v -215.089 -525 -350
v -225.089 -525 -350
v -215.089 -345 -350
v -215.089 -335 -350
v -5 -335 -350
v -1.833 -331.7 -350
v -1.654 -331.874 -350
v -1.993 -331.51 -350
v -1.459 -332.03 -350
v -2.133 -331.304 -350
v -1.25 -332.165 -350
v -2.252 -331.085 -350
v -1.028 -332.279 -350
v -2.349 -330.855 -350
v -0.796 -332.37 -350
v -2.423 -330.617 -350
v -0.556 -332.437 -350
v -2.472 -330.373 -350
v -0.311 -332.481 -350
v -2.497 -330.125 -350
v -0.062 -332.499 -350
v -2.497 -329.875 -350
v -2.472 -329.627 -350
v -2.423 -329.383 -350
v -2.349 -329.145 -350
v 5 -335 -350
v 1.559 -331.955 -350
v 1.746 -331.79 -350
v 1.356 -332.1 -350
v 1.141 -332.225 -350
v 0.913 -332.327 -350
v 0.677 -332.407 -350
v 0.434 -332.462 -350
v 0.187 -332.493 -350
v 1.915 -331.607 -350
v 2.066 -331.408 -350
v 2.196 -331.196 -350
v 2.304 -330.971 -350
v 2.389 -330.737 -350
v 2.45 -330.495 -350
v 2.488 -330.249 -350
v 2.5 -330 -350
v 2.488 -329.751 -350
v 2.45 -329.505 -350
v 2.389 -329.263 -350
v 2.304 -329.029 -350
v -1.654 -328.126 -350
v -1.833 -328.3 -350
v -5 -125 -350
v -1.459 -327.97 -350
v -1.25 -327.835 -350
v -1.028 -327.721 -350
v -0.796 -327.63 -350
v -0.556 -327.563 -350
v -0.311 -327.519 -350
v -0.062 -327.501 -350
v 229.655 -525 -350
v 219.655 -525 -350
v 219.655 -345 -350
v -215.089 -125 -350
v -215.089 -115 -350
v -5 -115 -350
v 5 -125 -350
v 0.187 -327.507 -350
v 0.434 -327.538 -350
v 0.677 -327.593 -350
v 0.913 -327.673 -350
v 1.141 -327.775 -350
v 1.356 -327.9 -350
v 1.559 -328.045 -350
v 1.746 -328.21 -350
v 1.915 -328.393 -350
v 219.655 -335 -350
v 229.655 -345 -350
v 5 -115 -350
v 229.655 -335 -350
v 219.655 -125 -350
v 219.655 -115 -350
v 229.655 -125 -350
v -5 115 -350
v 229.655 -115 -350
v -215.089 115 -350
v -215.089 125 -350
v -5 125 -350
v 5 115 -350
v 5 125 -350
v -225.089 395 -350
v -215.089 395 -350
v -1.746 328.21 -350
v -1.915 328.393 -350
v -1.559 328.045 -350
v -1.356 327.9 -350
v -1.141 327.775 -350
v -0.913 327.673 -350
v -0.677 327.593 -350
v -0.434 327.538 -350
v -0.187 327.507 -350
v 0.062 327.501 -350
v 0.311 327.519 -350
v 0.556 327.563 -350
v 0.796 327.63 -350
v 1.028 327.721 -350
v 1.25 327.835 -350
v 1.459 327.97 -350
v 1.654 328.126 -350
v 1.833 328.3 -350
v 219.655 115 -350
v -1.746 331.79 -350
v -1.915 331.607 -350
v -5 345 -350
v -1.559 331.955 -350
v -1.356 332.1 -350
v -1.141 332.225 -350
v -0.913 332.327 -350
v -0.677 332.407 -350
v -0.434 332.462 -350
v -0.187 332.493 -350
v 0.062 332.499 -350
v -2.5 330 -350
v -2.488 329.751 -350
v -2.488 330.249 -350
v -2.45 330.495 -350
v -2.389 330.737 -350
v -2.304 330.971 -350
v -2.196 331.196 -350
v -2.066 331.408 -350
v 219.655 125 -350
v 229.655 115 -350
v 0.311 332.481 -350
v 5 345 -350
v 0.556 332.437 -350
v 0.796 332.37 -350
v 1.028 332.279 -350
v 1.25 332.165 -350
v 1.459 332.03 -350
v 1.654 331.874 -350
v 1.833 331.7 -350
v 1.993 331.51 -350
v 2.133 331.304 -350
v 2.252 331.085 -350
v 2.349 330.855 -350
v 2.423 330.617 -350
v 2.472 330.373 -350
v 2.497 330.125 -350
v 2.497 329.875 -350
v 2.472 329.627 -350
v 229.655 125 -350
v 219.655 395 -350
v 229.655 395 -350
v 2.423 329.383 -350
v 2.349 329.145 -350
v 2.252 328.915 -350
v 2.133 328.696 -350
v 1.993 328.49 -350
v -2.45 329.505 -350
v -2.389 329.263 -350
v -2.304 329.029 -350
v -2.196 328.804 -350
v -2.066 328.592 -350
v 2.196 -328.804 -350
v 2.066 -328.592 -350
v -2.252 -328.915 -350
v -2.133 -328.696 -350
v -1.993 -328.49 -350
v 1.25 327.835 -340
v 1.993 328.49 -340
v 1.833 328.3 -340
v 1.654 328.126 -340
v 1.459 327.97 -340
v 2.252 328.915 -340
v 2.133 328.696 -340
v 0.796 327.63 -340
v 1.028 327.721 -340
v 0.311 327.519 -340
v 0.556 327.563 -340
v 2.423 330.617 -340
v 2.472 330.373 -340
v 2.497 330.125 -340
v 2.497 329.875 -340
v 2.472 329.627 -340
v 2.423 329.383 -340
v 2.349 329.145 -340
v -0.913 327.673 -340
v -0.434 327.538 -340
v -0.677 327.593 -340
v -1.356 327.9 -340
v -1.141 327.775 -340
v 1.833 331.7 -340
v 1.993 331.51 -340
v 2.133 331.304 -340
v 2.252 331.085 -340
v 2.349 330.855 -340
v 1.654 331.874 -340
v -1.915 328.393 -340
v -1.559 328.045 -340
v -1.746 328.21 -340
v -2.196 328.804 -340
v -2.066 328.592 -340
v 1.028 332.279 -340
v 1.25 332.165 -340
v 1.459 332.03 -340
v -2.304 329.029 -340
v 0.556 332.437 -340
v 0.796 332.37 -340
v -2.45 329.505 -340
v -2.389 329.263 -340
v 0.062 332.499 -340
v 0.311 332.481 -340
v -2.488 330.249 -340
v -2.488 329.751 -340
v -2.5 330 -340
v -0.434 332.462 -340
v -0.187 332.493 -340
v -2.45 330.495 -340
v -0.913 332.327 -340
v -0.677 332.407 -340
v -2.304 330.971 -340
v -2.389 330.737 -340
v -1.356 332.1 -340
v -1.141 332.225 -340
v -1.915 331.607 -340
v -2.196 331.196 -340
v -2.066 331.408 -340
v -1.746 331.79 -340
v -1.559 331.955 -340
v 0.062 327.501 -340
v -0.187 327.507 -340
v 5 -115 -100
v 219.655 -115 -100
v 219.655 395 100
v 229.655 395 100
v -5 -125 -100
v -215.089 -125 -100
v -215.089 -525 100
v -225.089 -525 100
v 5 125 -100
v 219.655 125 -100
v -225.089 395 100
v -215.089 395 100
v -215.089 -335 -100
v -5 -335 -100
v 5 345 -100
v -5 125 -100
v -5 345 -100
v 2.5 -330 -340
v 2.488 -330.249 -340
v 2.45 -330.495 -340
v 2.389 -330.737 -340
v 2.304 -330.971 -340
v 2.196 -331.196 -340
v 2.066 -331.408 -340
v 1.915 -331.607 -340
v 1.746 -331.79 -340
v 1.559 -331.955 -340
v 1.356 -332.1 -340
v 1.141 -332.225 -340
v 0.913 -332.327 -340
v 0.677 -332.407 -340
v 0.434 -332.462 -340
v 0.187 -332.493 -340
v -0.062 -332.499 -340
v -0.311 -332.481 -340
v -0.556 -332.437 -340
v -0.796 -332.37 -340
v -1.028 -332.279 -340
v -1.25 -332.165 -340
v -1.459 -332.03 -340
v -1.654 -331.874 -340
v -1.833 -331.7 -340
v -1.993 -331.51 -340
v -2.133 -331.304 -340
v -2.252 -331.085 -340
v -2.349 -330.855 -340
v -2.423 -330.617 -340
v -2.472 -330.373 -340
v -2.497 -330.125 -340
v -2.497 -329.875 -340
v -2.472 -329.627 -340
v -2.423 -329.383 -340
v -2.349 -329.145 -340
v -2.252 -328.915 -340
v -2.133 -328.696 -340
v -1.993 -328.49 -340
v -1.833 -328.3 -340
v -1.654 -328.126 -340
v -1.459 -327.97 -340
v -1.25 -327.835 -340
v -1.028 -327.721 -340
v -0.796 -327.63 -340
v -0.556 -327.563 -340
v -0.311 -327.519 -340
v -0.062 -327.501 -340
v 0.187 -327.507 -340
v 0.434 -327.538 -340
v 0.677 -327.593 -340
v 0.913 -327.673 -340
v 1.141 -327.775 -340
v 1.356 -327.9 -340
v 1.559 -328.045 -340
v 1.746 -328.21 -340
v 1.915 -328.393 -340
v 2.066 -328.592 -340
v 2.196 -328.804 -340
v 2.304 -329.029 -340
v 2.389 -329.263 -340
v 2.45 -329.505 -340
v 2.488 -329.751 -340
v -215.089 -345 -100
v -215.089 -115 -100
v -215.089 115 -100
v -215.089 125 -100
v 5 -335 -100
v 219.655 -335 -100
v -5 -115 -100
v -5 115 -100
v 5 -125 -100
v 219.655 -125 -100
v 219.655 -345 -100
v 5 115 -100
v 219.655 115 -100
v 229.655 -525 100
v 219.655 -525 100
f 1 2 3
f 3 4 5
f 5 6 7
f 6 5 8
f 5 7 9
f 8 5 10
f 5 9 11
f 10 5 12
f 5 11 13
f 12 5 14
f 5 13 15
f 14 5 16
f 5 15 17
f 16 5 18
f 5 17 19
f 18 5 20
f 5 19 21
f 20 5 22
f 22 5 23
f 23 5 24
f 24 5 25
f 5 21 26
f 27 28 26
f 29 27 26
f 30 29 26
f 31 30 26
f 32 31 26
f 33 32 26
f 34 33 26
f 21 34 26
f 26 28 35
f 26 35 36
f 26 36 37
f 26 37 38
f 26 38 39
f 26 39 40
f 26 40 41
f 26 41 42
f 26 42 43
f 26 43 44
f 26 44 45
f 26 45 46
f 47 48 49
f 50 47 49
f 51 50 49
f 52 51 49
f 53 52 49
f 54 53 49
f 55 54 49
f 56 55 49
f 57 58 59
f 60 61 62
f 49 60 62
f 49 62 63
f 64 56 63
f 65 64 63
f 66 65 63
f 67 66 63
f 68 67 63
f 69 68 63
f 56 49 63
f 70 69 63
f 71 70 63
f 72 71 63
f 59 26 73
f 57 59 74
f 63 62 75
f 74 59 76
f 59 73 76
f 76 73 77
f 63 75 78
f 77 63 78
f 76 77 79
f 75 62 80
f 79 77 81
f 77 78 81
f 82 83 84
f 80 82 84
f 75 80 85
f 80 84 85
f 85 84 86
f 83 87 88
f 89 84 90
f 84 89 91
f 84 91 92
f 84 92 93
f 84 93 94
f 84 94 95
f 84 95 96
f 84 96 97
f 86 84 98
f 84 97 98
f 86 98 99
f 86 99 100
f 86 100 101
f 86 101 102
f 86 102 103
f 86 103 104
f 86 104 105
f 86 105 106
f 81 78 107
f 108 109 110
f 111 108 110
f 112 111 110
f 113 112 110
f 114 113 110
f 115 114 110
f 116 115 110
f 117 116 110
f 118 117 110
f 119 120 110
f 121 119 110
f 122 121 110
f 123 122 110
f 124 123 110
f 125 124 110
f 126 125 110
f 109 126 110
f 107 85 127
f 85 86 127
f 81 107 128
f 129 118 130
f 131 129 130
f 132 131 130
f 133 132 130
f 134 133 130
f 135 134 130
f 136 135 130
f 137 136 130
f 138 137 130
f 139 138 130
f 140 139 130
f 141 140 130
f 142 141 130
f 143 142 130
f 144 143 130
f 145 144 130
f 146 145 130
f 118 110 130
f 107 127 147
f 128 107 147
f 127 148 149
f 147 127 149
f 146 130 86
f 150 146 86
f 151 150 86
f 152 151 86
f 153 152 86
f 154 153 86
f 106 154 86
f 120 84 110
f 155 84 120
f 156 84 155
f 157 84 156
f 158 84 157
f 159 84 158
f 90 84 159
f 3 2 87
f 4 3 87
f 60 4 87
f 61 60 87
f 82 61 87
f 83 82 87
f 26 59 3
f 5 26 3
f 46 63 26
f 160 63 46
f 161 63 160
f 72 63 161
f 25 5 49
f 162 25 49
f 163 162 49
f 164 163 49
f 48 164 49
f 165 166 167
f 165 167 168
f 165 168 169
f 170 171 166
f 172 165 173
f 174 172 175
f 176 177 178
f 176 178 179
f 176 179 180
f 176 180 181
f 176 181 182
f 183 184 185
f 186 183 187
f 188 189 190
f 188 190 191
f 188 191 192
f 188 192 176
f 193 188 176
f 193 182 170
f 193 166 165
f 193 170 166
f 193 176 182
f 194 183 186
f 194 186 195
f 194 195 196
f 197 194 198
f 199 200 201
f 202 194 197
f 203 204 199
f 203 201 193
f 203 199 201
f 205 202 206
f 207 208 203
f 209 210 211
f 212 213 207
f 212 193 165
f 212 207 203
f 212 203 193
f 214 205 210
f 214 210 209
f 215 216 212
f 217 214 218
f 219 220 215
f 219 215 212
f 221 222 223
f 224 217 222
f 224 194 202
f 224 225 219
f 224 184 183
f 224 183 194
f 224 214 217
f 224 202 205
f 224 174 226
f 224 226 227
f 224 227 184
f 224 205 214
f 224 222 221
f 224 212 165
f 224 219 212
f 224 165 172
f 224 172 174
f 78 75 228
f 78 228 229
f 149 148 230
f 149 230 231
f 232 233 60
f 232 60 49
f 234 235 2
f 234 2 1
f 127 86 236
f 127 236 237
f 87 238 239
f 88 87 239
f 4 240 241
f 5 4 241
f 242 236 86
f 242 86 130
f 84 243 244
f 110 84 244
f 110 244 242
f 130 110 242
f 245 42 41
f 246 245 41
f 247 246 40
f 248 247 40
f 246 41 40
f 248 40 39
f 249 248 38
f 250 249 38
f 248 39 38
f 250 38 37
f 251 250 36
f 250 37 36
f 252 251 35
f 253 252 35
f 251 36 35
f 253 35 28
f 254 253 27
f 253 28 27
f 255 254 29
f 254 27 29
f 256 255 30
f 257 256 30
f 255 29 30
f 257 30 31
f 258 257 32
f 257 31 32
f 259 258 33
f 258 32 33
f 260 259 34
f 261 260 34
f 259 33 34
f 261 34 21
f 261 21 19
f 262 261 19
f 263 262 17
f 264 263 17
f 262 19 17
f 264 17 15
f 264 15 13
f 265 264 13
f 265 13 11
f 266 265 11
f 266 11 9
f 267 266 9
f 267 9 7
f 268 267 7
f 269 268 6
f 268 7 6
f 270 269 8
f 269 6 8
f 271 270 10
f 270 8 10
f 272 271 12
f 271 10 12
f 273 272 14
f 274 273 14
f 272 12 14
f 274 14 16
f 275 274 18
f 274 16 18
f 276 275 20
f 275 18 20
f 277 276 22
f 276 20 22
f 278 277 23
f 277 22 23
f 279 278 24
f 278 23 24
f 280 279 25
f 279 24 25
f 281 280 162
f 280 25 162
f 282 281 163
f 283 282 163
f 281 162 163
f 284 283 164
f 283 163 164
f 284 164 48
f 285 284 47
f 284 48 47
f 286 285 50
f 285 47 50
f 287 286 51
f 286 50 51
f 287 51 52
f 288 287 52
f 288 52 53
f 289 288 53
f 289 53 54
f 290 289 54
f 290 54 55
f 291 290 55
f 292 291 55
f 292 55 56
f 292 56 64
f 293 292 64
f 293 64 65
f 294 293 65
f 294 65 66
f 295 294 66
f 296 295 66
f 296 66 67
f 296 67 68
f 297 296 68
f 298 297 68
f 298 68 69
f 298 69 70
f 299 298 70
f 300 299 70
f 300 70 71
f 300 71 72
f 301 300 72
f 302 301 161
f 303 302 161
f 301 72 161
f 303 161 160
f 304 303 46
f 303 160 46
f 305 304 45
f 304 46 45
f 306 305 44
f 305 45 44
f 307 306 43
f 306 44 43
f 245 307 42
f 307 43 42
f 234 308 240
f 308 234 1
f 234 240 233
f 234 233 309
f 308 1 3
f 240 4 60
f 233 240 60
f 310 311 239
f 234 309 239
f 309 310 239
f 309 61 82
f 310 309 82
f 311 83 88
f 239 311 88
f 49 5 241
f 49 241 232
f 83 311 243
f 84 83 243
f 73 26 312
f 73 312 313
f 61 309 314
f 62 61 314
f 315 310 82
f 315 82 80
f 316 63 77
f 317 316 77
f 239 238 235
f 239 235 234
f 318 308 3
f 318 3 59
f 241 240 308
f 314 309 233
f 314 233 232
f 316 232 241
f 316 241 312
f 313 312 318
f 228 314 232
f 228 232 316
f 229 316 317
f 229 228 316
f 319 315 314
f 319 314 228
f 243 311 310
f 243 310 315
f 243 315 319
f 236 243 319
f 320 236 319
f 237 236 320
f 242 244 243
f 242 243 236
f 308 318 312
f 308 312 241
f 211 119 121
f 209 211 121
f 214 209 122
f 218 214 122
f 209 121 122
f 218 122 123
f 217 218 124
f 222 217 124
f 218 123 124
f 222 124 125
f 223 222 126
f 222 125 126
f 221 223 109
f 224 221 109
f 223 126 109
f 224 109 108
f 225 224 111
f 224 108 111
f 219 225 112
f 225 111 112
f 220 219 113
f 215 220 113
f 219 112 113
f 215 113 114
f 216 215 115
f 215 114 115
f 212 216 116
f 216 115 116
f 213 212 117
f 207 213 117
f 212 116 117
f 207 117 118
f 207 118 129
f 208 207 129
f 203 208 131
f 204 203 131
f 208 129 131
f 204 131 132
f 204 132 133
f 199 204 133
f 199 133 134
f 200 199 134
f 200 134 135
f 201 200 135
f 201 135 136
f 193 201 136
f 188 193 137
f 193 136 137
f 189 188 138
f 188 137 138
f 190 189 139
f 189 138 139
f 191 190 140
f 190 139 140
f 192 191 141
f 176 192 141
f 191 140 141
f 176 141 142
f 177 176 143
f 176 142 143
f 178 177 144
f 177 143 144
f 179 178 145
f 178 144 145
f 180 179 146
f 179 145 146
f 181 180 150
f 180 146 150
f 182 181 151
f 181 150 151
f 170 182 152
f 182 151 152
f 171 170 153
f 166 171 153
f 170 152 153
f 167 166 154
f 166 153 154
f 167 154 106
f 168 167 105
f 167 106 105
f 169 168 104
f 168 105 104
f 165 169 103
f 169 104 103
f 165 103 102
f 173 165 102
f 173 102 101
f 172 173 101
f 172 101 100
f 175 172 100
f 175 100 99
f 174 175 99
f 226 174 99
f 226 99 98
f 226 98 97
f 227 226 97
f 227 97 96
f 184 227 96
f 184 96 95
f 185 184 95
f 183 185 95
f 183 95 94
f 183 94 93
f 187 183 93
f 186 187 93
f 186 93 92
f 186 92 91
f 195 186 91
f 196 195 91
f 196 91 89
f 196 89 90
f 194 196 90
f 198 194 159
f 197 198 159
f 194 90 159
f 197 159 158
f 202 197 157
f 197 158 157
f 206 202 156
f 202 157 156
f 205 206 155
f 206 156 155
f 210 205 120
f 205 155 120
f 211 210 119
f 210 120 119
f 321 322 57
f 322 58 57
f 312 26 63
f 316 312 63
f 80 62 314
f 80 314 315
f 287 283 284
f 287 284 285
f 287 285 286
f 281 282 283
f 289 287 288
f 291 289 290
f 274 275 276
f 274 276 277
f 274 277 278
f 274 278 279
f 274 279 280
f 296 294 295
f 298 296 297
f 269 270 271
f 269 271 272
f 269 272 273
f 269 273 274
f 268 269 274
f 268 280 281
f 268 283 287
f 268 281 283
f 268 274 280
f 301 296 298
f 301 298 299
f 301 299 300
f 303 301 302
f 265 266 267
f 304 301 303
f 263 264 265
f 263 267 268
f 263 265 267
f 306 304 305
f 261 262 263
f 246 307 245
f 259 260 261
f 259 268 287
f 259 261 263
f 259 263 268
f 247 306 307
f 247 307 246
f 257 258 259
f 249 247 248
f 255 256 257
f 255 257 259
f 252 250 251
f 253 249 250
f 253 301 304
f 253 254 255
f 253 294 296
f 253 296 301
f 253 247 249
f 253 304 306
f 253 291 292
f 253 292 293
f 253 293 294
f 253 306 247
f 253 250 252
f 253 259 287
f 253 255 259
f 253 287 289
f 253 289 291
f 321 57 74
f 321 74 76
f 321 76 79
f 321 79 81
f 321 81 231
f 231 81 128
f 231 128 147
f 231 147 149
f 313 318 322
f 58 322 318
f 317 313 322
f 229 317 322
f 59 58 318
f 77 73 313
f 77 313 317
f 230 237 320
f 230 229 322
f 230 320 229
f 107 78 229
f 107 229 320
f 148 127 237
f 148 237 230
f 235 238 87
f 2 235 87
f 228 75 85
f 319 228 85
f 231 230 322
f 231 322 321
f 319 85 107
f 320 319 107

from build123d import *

# Parameters (mm, degrees)
CROQUIS1_W              = 500
CROQUIS1_H              = 690
SALIENTE_EXTRUIR1_DEPTH = 350
CROQUIS2_W              = 245
CROQUIS2_H              = 210
CROQUIS2_H_2            = 230
CROQUIS2_H_3            = 220
CORTAR_EXTRUIR5_DEPTH   = 552.38462075
CROQUIS6_R              = 2.5
CORTAR_EXTRUIR6_DEPTH   = 10
CROQUIS8_W              = 454.743369925
CROQUIS8_H              = 727.77201974
CORTAR_EXTRUIR7_DEPTH   = 100
CROQUIS10_W             = 10
CROQUIS10_H             = 230
CROQUIS10_H_2           = 210
CROQUIS10_H_3           = 220
SALIENTE_EXTRUIR2_DEPTH = 250
CROQUIS11_W             = 564.486110896
CROQUIS11_H             = 131.072073745
CORTAR_EXTRUIR8_DEPTH   = 638.102817448
CROQUIS12_W             = 20.345466795
CROQUIS12_H             = 250
CROQUIS12_W_2           = 24.91116328
CORTAR_EXTRUIR9_DEPTH   = 638.102817448
CROQUIS13_W             = 10
CROQUIS13_H             = 920
SALIENTE_EXTRUIR3_DEPTH = 250
CROQUIS15_W             = 10
CROQUIS15_H             = 920
SALIENTE_EXTRUIR4_DEPTH = 200


with BuildPart() as part:
    # Croquis1 → Saliente-Extruir1 (new body)
    with BuildSketch(Plane.XY):
        Rectangle(CROQUIS1_W, CROQUIS1_H)
    extrude(amount=-SALIENTE_EXTRUIR1_DEPTH)

    # Croquis2 → Cortar-Extruir5 (cut, through all)
    with BuildSketch(Plane.XY):
        with Locations((127.5, -230)):
            Rectangle(CROQUIS2_W, CROQUIS2_H)
        with Locations((-127.5, -230)):
            Rectangle(CROQUIS2_W, CROQUIS2_H)
        with Locations((127.5, 0)):
            Rectangle(CROQUIS2_W, CROQUIS2_H_2)
        with Locations((-127.5, 0)):
            Rectangle(CROQUIS2_W, CROQUIS2_H_2)
        with Locations((127.5, 235)):
            Rectangle(CROQUIS2_W, CROQUIS2_H_3)
        with Locations((-127.5, 235)):
            Rectangle(CROQUIS2_W, CROQUIS2_H_3)
    extrude(amount=-CORTAR_EXTRUIR5_DEPTH, mode=Mode.SUBTRACT)

    # Croquis6 → Cortar-Extruir6 (cut)
    with BuildSketch(Plane(origin=(0, 0, -350), x_dir=(-1, 0, 0), z_dir=(0, 0, -1))):
        with Locations((0, 330)):
            Circle(CROQUIS6_R)
        with Locations(Location((0, -330, 0), (0, 0, 180))):
            Circle(CROQUIS6_R)
    extrude(amount=-CORTAR_EXTRUIR6_DEPTH, mode=Mode.SUBTRACT)

    # Croquis8 → Cortar-Extruir7 (cut)
    with BuildSketch(Plane.XY):
        with Locations((2.282848242, -2.282848243)):
            Rectangle(CROQUIS8_W, CROQUIS8_H)
    extrude(amount=-CORTAR_EXTRUIR7_DEPTH, mode=Mode.SUBTRACT)

    # Croquis10 → Saliente-Extruir2 (add)
    with BuildSketch(Plane.XY.offset(-100)):
        Polygon((219.654533205, 345.243801015), (219.654533205, 125), (229.654533205, 125), (229.654533205, 345.045421076), align=None)
        with Locations((224.654533205, 0)):
            Rectangle(CROQUIS10_W, CROQUIS10_H)
        with Locations((224.654533205, -230)):
            Rectangle(CROQUIS10_W, CROQUIS10_H_2)
        with Locations((-220.08883672, -230)):
            Rectangle(CROQUIS10_W, CROQUIS10_H_2)
        with Locations((-220.08883672, 0)):
            Rectangle(CROQUIS10_W, CROQUIS10_H)
        with Locations((-220.08883672, 235)):
            Rectangle(CROQUIS10_W, CROQUIS10_H_3)
    extrude(amount=-SALIENTE_EXTRUIR2_DEPTH)

    # Croquis11 → Cortar-Extruir8 (cut, through all)
    with BuildSketch(Plane(origin=(0, 125, 0), x_dir=(1, 0, 0), z_dir=(0, 1, 0))):
        with Locations((-2.812204357, 34.463963128)):
            Rectangle(CROQUIS11_W, CROQUIS11_H)
    extrude(amount=-CORTAR_EXTRUIR8_DEPTH, mode=Mode.SUBTRACT)

    # Croquis12 → Cortar-Extruir9 (cut, through all)
    with BuildSketch(Plane(origin=(0, 125, 0), x_dir=(1, 0, 0), z_dir=(0, 1, 0))):
        with Locations((239.827266603, 225)):
            Rectangle(CROQUIS12_W, CROQUIS12_H)
        with Locations((-237.54441836, 225)):
            Rectangle(CROQUIS12_W_2, CROQUIS12_H)
    extrude(amount=-CORTAR_EXTRUIR9_DEPTH, mode=Mode.SUBTRACT)

    # Croquis13 → Saliente-Extruir3 (add)
    with BuildSketch(Plane.XY.offset(-100)):
        with Locations((224.654533205, -65)):
            Rectangle(CROQUIS13_W, CROQUIS13_H)
        with Locations((-220.08883672, -65)):
            Rectangle(CROQUIS13_W, CROQUIS13_H)
    extrude(amount=-SALIENTE_EXTRUIR3_DEPTH)

    # Croquis15 → Saliente-Extruir4 (add)
    with BuildSketch(Plane.XY.offset(-100)):
        with Locations((224.654533205, -65)):
            Rectangle(CROQUIS15_W, CROQUIS15_H)
        with Locations((-220.08883672, -65)):
            Rectangle(CROQUIS15_W, CROQUIS15_H)
    extrude(amount=SALIENTE_EXTRUIR4_DEPTH)


solid = part.part
